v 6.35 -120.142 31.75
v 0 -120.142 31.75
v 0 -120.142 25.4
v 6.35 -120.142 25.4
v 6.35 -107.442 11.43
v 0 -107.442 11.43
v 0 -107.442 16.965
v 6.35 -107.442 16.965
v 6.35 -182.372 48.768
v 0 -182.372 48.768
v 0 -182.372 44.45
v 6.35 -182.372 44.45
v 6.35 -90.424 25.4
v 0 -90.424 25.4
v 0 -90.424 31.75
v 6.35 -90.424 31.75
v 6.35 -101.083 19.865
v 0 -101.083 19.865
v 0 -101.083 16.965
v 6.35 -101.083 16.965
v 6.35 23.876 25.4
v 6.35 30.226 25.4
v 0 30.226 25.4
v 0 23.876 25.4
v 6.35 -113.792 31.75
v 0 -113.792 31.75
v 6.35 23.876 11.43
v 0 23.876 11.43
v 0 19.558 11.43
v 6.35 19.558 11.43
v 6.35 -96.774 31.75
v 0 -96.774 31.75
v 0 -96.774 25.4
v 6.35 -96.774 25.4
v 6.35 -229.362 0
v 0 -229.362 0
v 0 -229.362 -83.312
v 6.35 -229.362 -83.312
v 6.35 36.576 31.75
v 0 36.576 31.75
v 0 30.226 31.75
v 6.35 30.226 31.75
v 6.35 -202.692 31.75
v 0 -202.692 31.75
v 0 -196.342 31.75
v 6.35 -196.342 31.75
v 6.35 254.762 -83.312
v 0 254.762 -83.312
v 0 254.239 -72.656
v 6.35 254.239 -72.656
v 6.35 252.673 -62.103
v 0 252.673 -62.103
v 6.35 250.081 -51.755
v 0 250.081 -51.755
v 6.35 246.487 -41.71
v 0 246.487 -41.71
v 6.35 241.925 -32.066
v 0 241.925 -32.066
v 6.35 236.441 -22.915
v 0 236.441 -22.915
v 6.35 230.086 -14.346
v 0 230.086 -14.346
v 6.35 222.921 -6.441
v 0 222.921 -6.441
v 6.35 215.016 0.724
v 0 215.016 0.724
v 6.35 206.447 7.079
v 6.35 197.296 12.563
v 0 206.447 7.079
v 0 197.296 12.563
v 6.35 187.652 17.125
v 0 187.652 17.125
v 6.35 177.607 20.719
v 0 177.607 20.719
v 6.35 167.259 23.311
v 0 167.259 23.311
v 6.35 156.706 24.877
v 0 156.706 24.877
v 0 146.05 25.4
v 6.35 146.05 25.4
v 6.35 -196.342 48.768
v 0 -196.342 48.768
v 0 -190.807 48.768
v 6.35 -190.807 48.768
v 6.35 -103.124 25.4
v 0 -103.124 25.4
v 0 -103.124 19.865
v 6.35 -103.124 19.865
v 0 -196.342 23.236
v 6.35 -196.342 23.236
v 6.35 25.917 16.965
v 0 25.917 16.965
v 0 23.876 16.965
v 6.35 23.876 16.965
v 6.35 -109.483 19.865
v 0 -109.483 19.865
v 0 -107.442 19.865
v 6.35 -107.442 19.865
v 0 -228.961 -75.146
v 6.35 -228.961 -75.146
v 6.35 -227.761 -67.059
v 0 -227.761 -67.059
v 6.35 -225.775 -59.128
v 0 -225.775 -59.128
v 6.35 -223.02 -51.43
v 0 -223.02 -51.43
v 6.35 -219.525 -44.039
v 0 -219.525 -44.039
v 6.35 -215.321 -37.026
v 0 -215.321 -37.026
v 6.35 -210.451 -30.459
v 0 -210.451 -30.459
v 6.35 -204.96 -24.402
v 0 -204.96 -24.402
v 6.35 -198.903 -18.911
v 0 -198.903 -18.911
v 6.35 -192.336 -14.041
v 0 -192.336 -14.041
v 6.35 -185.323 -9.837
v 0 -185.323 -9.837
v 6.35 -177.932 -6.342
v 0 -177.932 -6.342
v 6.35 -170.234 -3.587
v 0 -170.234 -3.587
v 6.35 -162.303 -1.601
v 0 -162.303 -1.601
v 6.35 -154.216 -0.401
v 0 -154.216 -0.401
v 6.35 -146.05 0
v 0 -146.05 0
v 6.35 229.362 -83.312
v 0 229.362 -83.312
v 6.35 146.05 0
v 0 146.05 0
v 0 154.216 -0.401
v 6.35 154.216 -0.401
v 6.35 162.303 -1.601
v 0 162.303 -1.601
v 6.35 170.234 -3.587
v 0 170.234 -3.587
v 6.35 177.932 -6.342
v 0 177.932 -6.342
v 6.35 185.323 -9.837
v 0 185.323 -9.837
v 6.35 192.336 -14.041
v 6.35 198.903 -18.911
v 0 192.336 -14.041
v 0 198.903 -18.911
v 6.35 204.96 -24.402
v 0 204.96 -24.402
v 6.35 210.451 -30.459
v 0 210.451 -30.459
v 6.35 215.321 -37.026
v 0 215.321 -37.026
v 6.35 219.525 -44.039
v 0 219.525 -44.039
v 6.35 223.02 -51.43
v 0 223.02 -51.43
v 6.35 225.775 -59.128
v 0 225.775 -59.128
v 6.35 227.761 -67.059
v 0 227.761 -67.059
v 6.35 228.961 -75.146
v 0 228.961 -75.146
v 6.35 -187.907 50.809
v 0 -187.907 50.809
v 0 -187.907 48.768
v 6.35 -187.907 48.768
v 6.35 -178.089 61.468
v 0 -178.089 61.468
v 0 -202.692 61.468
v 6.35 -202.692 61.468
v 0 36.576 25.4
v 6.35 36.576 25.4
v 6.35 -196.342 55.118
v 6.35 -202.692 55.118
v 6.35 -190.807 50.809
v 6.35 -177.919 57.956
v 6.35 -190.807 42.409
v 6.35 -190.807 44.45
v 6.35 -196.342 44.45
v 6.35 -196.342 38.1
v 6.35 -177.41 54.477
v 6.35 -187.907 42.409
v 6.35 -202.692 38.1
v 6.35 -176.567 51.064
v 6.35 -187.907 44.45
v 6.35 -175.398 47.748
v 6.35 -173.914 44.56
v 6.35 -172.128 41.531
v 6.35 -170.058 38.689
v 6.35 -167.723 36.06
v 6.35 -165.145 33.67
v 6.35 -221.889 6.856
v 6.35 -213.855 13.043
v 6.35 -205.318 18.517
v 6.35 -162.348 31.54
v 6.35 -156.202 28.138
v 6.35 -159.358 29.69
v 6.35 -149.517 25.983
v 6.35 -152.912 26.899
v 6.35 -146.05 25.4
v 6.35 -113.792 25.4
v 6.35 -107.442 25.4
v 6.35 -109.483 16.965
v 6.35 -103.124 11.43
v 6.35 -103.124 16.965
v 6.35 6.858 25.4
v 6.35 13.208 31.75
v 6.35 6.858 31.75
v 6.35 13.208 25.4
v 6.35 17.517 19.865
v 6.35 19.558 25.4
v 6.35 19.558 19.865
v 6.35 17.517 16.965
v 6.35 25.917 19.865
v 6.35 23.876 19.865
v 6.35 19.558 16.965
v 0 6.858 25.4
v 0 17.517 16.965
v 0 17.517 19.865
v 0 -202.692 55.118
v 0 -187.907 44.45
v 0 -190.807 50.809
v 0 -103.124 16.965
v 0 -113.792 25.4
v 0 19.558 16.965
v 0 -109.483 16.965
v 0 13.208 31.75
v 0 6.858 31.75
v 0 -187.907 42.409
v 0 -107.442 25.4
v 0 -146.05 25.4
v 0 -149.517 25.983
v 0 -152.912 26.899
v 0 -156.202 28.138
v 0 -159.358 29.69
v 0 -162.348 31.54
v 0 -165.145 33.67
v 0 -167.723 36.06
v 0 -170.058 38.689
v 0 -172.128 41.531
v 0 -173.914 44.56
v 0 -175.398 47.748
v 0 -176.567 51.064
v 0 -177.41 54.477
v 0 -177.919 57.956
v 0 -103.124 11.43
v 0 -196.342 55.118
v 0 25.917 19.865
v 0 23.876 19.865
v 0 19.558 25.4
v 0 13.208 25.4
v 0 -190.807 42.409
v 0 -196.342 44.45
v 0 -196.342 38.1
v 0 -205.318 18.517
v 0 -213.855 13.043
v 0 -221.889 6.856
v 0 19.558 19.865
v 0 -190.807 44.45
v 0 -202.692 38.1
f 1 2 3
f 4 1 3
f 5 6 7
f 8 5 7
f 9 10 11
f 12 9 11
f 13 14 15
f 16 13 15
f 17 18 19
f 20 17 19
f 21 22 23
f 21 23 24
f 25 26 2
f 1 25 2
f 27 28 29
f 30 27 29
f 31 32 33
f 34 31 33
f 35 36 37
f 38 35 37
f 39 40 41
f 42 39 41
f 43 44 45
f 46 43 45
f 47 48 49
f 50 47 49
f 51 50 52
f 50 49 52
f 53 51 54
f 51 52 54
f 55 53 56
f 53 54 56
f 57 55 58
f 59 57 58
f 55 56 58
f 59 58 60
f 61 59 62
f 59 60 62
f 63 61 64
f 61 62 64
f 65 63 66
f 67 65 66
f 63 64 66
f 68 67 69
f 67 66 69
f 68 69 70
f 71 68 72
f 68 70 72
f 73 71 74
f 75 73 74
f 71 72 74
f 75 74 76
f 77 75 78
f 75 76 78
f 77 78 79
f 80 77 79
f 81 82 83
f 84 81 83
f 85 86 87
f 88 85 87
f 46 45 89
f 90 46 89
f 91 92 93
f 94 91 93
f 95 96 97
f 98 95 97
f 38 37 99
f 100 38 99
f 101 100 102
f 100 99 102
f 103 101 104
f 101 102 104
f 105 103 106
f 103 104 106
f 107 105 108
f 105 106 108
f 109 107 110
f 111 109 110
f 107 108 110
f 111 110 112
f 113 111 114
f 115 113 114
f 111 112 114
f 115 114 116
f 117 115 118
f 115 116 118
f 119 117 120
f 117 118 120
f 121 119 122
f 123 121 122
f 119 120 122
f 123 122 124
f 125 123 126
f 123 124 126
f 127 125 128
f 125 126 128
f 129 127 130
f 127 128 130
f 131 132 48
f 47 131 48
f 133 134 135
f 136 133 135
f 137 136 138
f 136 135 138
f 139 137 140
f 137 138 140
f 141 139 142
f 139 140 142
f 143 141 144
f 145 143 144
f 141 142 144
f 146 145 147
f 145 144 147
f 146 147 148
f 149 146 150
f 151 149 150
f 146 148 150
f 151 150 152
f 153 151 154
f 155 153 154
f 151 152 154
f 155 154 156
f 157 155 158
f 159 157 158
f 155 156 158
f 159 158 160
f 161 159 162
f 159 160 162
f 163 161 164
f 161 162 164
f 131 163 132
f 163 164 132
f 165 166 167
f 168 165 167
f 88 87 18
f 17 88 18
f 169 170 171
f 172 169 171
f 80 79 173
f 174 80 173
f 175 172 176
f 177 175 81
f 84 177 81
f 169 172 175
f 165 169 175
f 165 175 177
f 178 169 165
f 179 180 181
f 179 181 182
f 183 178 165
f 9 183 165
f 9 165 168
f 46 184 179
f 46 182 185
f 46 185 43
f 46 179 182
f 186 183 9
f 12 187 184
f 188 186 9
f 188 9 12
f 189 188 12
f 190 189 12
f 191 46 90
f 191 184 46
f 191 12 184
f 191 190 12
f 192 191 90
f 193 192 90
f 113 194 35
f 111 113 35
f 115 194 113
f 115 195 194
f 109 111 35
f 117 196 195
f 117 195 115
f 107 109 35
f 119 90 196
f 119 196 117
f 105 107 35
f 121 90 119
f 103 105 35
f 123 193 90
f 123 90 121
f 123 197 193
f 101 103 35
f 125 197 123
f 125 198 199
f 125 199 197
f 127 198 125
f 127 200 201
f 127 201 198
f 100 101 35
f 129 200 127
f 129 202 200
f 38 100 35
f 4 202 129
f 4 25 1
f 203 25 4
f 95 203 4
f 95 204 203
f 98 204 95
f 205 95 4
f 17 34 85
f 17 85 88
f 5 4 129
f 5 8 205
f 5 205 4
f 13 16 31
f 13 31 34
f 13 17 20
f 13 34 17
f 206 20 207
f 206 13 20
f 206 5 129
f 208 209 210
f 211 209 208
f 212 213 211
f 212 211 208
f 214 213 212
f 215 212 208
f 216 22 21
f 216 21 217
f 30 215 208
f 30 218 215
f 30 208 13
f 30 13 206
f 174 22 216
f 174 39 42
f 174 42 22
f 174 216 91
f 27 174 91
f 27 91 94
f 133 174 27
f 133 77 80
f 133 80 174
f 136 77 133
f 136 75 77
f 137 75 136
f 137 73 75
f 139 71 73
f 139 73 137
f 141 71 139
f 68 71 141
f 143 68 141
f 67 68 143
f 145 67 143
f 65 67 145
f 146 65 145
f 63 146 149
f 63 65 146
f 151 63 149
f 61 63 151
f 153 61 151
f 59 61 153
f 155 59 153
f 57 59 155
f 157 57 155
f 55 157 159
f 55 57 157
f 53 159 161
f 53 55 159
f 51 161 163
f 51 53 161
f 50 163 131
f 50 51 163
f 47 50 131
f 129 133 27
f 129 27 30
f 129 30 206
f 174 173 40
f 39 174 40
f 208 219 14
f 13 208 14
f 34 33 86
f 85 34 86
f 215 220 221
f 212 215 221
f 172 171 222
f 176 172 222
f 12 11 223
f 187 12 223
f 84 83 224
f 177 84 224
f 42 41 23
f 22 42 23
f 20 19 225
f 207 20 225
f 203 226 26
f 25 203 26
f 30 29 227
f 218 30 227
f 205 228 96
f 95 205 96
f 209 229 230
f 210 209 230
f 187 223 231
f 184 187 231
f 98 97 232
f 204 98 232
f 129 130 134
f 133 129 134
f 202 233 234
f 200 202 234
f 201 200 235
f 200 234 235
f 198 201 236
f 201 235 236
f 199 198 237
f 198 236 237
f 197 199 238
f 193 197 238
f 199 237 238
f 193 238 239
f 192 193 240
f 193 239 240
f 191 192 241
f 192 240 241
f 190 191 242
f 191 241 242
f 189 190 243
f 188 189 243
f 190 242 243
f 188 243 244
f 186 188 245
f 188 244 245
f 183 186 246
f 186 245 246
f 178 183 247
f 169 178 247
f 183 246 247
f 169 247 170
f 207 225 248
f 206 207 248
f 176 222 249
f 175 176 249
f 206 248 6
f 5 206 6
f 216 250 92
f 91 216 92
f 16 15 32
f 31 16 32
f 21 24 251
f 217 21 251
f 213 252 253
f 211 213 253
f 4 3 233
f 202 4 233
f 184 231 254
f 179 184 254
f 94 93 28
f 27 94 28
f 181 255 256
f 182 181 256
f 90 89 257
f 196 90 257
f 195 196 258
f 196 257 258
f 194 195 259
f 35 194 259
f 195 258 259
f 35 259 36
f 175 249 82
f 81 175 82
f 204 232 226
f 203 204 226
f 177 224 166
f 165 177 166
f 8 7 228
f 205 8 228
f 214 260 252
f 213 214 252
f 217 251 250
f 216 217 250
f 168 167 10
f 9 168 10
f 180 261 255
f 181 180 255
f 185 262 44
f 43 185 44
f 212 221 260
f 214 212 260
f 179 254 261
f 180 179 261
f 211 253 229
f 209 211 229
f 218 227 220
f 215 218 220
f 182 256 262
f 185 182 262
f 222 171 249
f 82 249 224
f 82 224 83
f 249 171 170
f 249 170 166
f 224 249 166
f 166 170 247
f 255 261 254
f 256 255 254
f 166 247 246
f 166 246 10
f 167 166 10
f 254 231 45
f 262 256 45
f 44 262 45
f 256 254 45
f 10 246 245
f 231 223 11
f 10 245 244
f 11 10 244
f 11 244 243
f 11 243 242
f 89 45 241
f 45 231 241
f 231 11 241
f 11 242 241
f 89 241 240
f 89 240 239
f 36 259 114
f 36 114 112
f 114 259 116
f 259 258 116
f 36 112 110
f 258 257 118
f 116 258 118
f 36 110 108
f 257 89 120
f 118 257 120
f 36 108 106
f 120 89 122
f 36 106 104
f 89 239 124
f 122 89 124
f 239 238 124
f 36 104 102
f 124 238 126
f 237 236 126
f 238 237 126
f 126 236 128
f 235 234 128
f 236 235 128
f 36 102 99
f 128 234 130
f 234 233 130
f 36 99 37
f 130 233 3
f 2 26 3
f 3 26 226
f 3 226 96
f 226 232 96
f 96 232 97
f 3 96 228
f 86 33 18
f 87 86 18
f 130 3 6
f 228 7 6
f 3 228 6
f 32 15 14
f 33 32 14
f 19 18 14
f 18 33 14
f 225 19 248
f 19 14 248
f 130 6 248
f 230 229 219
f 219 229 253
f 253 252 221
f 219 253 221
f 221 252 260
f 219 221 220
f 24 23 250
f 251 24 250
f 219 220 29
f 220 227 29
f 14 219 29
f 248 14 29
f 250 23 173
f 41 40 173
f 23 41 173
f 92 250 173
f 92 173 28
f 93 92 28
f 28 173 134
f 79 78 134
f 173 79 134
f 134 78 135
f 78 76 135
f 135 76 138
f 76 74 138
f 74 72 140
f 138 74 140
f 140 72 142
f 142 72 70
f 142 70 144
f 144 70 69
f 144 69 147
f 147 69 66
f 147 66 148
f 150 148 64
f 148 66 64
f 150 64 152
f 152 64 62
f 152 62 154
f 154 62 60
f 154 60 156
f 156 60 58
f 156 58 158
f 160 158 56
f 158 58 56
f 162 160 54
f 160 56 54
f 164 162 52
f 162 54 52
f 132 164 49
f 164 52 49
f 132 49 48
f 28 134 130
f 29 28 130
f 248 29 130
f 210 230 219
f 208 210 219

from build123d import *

# Parameters (mm, degrees)
BOSS_EXTRUDE2_DEPTH = 6.35


with BuildPart() as part:
    # Elevator Ball Support Rail → Boss-Extrude2 (new body)
    with BuildSketch(Plane(origin=(0, 0, 0), x_dir=(0, 0, -1), z_dir=(1, 0, 0))):
        with BuildLine():
            ThreePointArc((0, 146.05), (24.401519846, 204.960480154), (83.312, 229.362))
            Line((83.312, 229.362), (83.312, 254.762))
            ThreePointArc((83.312, 254.762), (6.441007604, 222.920992396), (-25.4, 146.05))
            Line((-25.4, 146.05), (-25.4, 36.576))
            Line((-25.4, 36.576), (-31.75, 36.576))
            Line((-31.75, 36.576), (-31.75, 30.226))
            Line((-31.75, 30.226), (-25.4, 30.226))
            Line((-25.4, 30.226), (-25.4, 23.876))
            Line((-25.4, 23.876), (-19.865000021, 23.876))
            Line((-19.865000021, 23.876), (-19.865000021, 25.916999982))
            Line((-19.865000021, 25.916999982), (-16.964999979, 25.916999982))
            Line((-16.964999979, 25.916999982), (-16.964999979, 23.876))
            Line((-16.964999979, 23.876), (-11.43, 23.876))
            Line((-11.43, 23.876), (-11.43, 19.558))
            Line((-11.43, 19.558), (-16.964999979, 19.558))
            Line((-16.964999979, 19.558), (-16.964999979, 17.517000018))
            Line((-16.964999979, 17.517000018), (-19.865000021, 17.517000018))
            Line((-19.865000021, 17.517000018), (-19.865000021, 19.558))
            Line((-19.865000021, 19.558), (-25.4, 19.558))
            Line((-25.4, 19.558), (-25.4, 13.208))
            Line((-25.4, 13.208), (-31.75, 13.208))
            Line((-31.75, 13.208), (-31.75, 6.858))
            Line((-31.75, 6.858), (-25.4, 6.858))
            Line((-25.4, 6.858), (-25.4, -90.424))
            Line((-25.4, -90.424), (-31.75, -90.424))
            Line((-31.75, -90.424), (-31.75, -96.774))
            Line((-31.75, -96.774), (-25.4, -96.774))
            Line((-25.4, -96.774), (-25.4, -103.124))
            Line((-25.4, -103.124), (-19.865000021, -103.124))
            Line((-19.865000021, -103.124), (-19.865000021, -101.083000018))
            Line((-19.865000021, -101.083000018), (-16.964999979, -101.083000018))
            Line((-16.964999979, -101.083000018), (-16.964999979, -103.124))
            Line((-16.964999979, -103.124), (-11.43, -103.124))
            Line((-11.43, -103.124), (-11.43, -107.442))
            Line((-11.43, -107.442), (-16.964999979, -107.442))
            Line((-16.964999979, -107.442), (-16.964999979, -109.482999982))
            Line((-16.964999979, -109.482999982), (-19.865000021, -109.482999982))
            Line((-19.865000021, -109.482999982), (-19.865000021, -107.442))
            Line((-19.865000021, -107.442), (-25.4, -107.442))
            Line((-25.4, -107.442), (-25.4, -113.792))
            Line((-25.4, -113.792), (-31.75, -113.792))
            Line((-31.75, -113.792), (-31.75, -120.142))
            Line((-31.75, -120.142), (-25.4, -120.142))
            Line((-25.4, -120.142), (-25.4, -146.05))
            ThreePointArc((-25.4, -146.05), (-37.346353976, -168.922761976), (-61.468, -178.08926659))
            Line((-61.468, -178.08926659), (-61.468, -196.342))
            Line((-61.468, -196.342), (-61.468, -202.692))
            Line((-61.468, -202.692), (-55.118, -202.692))
            Line((-55.118, -202.692), (-55.118, -196.342))
            Line((-55.118, -196.342), (-48.768, -196.342))
            Line((-48.768, -196.342), (-48.768, -190.807000021))
            Line((-48.768, -190.807000021), (-50.808999982, -190.807000021))
            Line((-50.808999982, -190.807000021), (-50.808999982, -187.906999979))
            Line((-50.808999982, -187.906999979), (-48.768, -187.906999979))
            Line((-48.768, -187.906999979), (-48.768, -182.372))
            Line((-48.768, -182.372), (-44.45, -182.372))
            Line((-44.45, -182.372), (-44.45, -187.906999979))
            Line((-44.45, -187.906999979), (-42.409000018, -187.906999979))
            Line((-42.409000018, -187.906999979), (-42.409000018, -190.807000021))
            Line((-42.409000018, -190.807000021), (-44.45, -190.807000021))
            Line((-44.45, -190.807000021), (-44.45, -196.342))
            Line((-44.45, -196.342), (-38.1, -196.342))
            Line((-38.1, -196.342), (-38.1, -202.692))
            Line((-38.1, -202.692), (-31.75, -202.692))
            Line((-31.75, -202.692), (-31.75, -196.342))
            Line((-31.75, -196.342), (-23.236080339, -196.342))
            ThreePointArc((-23.236080339, -196.342), (-13.043034257, -213.854764297), (0, -229.362))
            Line((0, -229.362), (83.312, -229.362))
            ThreePointArc((83.312, -229.362), (24.401519846, -204.960480154), (0, -146.05))
            Line((0, -146.05), (0, 146.05))
        make_face()
    extrude(amount=BOSS_EXTRUDE2_DEPTH)


solid = part.part
